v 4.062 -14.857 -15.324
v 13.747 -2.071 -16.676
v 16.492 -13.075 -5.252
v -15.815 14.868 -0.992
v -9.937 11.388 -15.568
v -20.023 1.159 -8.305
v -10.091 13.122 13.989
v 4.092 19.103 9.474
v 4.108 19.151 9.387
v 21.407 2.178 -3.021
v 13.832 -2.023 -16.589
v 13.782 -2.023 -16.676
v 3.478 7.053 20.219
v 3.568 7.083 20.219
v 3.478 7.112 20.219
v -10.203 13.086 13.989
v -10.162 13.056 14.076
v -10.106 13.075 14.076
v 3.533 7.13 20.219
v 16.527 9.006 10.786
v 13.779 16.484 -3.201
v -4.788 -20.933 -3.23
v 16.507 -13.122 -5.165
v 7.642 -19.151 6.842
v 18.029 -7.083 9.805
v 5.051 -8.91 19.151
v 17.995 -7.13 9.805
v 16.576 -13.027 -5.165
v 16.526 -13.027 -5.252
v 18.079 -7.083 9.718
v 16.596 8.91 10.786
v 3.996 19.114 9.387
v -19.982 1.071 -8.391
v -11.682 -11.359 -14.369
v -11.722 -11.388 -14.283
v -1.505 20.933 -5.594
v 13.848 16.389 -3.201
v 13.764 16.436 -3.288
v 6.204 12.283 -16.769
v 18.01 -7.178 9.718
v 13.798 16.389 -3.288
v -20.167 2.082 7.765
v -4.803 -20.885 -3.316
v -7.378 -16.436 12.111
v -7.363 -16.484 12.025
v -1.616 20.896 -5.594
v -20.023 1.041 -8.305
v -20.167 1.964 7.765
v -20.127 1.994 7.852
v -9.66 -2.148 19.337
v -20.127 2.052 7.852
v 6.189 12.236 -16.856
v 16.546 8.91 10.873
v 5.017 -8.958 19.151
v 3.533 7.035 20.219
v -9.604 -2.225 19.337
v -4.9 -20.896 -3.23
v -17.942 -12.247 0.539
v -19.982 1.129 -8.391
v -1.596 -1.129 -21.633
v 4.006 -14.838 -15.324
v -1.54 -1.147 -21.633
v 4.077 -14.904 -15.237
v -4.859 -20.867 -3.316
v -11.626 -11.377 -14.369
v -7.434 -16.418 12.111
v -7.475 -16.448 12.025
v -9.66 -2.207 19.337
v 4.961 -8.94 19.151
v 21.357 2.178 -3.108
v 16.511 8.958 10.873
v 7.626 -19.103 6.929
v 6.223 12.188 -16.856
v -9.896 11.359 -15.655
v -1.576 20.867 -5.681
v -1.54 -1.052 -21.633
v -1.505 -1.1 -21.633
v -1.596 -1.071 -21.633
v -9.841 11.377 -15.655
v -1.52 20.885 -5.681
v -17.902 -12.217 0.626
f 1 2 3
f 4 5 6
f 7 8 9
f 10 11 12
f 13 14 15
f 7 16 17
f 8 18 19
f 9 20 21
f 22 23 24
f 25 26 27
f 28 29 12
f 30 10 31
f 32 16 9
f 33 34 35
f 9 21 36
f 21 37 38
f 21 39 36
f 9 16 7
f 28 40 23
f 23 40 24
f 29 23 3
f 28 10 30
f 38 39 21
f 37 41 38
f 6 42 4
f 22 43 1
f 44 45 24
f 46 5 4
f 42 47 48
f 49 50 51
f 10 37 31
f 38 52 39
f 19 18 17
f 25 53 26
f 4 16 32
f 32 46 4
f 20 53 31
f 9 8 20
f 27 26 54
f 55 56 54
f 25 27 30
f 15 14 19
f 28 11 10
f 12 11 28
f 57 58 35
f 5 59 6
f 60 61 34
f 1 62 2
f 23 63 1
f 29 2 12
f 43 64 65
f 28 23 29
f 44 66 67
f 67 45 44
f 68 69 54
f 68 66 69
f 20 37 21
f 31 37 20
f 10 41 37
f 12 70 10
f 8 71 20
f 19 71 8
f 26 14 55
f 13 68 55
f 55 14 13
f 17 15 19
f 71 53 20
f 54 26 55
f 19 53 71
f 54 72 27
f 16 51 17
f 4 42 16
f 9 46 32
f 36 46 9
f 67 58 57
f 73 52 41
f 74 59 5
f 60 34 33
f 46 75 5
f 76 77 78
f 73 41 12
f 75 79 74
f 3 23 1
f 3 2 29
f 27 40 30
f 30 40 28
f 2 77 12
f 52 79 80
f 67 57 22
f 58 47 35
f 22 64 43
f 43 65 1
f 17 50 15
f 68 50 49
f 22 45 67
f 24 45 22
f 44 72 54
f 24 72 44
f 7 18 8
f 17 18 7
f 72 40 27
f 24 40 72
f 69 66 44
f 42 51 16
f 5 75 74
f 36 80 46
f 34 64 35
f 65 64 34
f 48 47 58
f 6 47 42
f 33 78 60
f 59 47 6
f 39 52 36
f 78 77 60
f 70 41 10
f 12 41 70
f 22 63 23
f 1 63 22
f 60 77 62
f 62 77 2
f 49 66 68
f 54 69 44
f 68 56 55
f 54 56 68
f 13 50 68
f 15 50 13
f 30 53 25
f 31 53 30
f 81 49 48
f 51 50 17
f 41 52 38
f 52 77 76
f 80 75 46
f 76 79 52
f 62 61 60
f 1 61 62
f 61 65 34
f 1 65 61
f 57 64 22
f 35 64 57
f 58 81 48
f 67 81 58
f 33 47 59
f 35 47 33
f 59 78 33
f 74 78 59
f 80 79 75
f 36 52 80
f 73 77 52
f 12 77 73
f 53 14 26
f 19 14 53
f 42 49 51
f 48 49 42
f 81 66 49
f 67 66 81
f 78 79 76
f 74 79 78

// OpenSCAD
// Auto-generated OpenSCAD file

    inner_points = 10*[[-0.9619280030809705, -0.21776887860633187, 1.925057075212961], [-1.7861093101272143, -1.2188013311674697, 0.053947732570656215], [0.6173373045353625, 1.2188013311674197, -1.6768993643036296], [2.1307000086728896, 0.21776887860644203, -0.30210544347998747], [-1.573413807384223, 1.4809108094590682, -0.09922537774321771], [0.7611001812334521, -1.9055577204426604, 0.6842147313644074], [0.4076718243584673, 1.9055577204427707, 0.9387369003685662], [0.40464180179237125, -1.480910809459118, -1.5237262539897558], [-1.0121855894512641, 1.3027105454435493, 1.3989278314929954], [-0.4818921042078648, -2.0837579844583027, -0.32296466143624797], [-0.1535563935744915, 2.0837579844582894, -0.5594163088676467], [1.647634087233688, -1.3027105454434755, -0.5165468611891005], [-2.008643459397785, 0.2023077608806283, 0.7765285141797601], [-0.7393938538103997, -1.6388779706544299, 1.202476293603857], [1.3748423515928236, 1.6388779706545036, -0.3200953232999624], [1.3731949616154284, -0.20230776088064173, -1.658909484483655], [0.3517960678972403, 0.7082694102758283, 2.013247992550328], [-1.1641096940480111, -1.1329163212594207, -1.4282586389291383], [-0.9855971757022011, 1.1329163212593036, -1.5568148016705303], [1.7979108018530396, -0.7082694102756509, 0.9718254480493408], [-1.9941876309775086, 0.10999250677307847, -0.8304762798167951], [0.5001099373183797, -0.891039945787832, 1.9064394498735424], [1.6495969324319002, 0.8910399457880095, 1.0786339907261262], [-0.15551923877270382, -0.10999250677319566, -2.1545971607828736]];

    outer_points = 10*[[-1.7861093101272378, -1.218801331167483, 0.05394773257047536], [-0.9619280030811203, -0.21776887860643623, 1.9250570752128846], [2.1307000086728944, 0.21776887860643623, -0.3021054434798307], [0.6173373045354636, 1.218801331167483, -1.6768993643035293], [0.7611001812333835, -1.9055577204427099, 0.6842147313643689], [-1.5734138073842294, 1.4809108094590613, -0.09922537774325535], [0.40464180179245535, -1.4809108094590613, -1.5237262539897984], [0.40767182435839056, 1.9055577204427099, 0.938736900368685], [-0.4818921042078646, -2.0837579844583014, -0.32296466143638025], [-1.0121855894513736, 1.30271054544347, 1.3989278314929876], [1.6476340872337034, -1.30271054544347, -0.5165468611890494], [-0.153556393574465, 2.0837579844583014, -0.5594163088675581], [-0.7393938538105033, -1.6388779706545002, 1.2024762936037283], [-2.0086434593978546, 0.2023077608805811, 0.7765285141796316], [1.3731949616155252, -0.2023077608805811, -1.6589094844835701], [1.3748423515928327, 1.6388779706545002, -0.32009532329979], [-1.1641096940479327, -1.132916321259365, -1.4282586389292722], [0.35179606789708695, 0.7082694102757165, 2.0132479925503857], [1.7979108018529546, -0.7082694102757165, 0.9718254480494307], [-0.9855971757021086, 1.132916321259365, -1.5568148016705443], [0.5001099373182297, -0.891039945787939, 1.9064394498735344], [-1.9941876309774682, 0.10999250677310773, -0.830476279816927], [-0.15551923877257323, -0.10999250677310773, -2.1545971607828895], [1.6495969324318116, 0.891039945787939, 1.078633990726282]];

    // Convex hull for inner set (I)
    module inner_hull() {
        hull() {
            for (p = inner_points) {
                translate(p) sphere(r=0.1);
            }
        }
    }

    // Convex hull for outer set (O) minus inner hull (O \ I)
    module outer_minus_inner() {
        difference() {
            hull() {
                for (p = outer_points) {
                    translate(p) sphere(r=0.1);
                }
            }
            inner_hull(); // Subtract inner hull
        }
    }

    // Convex hull for outer set (O) minus all translated inner hulls
    module outer_minus_AllTranslationInner() {
        difference() {
            hull() {
                for (p = outer_points) {
                    translate(p) sphere(r=0.1);
                }
            }
            hull() {
                translate([0,0,5]) inner_hull();
                translate([0,0,-5]) inner_hull();
            }; // Subtract translated inner hulls
        }
    }

    // Difference between outer_minus_inner and outer_minus_AllTranslationInner
    module outer_minus_inner_diff() {
        difference() {
            // Outer minus inner
            difference() {
                hull() {
                    for (p = outer_points) {
                        translate(p) sphere(r=0.1);
                    }
                }
                inner_hull();
            }

            // Subtract Outer minus AllTranslationInner
            difference() {
                hull() {
                    for (p = outer_points) {
                        translate(p) sphere(r=0.1);
                    }
                }
                hull() {
                    translate([0,0,5]) inner_hull();
                    translate([0,0,-5]) inner_hull();
                };
            }
        }
    }

    // Rendering all with colors applied
    color([1, 0, 0, 0.5]) inner_hull(); // Transparent red
    // color([0, 0, 1, 1]) outer_minus_inner(); // Opaque blue
    // color([0, 1, 0, 1]) outer_minus_AllTranslationInner(); // Opaque green
    // color([1, 1, 0, 1]) outer_minus_inner_diff(); // Opaque yellow
    
